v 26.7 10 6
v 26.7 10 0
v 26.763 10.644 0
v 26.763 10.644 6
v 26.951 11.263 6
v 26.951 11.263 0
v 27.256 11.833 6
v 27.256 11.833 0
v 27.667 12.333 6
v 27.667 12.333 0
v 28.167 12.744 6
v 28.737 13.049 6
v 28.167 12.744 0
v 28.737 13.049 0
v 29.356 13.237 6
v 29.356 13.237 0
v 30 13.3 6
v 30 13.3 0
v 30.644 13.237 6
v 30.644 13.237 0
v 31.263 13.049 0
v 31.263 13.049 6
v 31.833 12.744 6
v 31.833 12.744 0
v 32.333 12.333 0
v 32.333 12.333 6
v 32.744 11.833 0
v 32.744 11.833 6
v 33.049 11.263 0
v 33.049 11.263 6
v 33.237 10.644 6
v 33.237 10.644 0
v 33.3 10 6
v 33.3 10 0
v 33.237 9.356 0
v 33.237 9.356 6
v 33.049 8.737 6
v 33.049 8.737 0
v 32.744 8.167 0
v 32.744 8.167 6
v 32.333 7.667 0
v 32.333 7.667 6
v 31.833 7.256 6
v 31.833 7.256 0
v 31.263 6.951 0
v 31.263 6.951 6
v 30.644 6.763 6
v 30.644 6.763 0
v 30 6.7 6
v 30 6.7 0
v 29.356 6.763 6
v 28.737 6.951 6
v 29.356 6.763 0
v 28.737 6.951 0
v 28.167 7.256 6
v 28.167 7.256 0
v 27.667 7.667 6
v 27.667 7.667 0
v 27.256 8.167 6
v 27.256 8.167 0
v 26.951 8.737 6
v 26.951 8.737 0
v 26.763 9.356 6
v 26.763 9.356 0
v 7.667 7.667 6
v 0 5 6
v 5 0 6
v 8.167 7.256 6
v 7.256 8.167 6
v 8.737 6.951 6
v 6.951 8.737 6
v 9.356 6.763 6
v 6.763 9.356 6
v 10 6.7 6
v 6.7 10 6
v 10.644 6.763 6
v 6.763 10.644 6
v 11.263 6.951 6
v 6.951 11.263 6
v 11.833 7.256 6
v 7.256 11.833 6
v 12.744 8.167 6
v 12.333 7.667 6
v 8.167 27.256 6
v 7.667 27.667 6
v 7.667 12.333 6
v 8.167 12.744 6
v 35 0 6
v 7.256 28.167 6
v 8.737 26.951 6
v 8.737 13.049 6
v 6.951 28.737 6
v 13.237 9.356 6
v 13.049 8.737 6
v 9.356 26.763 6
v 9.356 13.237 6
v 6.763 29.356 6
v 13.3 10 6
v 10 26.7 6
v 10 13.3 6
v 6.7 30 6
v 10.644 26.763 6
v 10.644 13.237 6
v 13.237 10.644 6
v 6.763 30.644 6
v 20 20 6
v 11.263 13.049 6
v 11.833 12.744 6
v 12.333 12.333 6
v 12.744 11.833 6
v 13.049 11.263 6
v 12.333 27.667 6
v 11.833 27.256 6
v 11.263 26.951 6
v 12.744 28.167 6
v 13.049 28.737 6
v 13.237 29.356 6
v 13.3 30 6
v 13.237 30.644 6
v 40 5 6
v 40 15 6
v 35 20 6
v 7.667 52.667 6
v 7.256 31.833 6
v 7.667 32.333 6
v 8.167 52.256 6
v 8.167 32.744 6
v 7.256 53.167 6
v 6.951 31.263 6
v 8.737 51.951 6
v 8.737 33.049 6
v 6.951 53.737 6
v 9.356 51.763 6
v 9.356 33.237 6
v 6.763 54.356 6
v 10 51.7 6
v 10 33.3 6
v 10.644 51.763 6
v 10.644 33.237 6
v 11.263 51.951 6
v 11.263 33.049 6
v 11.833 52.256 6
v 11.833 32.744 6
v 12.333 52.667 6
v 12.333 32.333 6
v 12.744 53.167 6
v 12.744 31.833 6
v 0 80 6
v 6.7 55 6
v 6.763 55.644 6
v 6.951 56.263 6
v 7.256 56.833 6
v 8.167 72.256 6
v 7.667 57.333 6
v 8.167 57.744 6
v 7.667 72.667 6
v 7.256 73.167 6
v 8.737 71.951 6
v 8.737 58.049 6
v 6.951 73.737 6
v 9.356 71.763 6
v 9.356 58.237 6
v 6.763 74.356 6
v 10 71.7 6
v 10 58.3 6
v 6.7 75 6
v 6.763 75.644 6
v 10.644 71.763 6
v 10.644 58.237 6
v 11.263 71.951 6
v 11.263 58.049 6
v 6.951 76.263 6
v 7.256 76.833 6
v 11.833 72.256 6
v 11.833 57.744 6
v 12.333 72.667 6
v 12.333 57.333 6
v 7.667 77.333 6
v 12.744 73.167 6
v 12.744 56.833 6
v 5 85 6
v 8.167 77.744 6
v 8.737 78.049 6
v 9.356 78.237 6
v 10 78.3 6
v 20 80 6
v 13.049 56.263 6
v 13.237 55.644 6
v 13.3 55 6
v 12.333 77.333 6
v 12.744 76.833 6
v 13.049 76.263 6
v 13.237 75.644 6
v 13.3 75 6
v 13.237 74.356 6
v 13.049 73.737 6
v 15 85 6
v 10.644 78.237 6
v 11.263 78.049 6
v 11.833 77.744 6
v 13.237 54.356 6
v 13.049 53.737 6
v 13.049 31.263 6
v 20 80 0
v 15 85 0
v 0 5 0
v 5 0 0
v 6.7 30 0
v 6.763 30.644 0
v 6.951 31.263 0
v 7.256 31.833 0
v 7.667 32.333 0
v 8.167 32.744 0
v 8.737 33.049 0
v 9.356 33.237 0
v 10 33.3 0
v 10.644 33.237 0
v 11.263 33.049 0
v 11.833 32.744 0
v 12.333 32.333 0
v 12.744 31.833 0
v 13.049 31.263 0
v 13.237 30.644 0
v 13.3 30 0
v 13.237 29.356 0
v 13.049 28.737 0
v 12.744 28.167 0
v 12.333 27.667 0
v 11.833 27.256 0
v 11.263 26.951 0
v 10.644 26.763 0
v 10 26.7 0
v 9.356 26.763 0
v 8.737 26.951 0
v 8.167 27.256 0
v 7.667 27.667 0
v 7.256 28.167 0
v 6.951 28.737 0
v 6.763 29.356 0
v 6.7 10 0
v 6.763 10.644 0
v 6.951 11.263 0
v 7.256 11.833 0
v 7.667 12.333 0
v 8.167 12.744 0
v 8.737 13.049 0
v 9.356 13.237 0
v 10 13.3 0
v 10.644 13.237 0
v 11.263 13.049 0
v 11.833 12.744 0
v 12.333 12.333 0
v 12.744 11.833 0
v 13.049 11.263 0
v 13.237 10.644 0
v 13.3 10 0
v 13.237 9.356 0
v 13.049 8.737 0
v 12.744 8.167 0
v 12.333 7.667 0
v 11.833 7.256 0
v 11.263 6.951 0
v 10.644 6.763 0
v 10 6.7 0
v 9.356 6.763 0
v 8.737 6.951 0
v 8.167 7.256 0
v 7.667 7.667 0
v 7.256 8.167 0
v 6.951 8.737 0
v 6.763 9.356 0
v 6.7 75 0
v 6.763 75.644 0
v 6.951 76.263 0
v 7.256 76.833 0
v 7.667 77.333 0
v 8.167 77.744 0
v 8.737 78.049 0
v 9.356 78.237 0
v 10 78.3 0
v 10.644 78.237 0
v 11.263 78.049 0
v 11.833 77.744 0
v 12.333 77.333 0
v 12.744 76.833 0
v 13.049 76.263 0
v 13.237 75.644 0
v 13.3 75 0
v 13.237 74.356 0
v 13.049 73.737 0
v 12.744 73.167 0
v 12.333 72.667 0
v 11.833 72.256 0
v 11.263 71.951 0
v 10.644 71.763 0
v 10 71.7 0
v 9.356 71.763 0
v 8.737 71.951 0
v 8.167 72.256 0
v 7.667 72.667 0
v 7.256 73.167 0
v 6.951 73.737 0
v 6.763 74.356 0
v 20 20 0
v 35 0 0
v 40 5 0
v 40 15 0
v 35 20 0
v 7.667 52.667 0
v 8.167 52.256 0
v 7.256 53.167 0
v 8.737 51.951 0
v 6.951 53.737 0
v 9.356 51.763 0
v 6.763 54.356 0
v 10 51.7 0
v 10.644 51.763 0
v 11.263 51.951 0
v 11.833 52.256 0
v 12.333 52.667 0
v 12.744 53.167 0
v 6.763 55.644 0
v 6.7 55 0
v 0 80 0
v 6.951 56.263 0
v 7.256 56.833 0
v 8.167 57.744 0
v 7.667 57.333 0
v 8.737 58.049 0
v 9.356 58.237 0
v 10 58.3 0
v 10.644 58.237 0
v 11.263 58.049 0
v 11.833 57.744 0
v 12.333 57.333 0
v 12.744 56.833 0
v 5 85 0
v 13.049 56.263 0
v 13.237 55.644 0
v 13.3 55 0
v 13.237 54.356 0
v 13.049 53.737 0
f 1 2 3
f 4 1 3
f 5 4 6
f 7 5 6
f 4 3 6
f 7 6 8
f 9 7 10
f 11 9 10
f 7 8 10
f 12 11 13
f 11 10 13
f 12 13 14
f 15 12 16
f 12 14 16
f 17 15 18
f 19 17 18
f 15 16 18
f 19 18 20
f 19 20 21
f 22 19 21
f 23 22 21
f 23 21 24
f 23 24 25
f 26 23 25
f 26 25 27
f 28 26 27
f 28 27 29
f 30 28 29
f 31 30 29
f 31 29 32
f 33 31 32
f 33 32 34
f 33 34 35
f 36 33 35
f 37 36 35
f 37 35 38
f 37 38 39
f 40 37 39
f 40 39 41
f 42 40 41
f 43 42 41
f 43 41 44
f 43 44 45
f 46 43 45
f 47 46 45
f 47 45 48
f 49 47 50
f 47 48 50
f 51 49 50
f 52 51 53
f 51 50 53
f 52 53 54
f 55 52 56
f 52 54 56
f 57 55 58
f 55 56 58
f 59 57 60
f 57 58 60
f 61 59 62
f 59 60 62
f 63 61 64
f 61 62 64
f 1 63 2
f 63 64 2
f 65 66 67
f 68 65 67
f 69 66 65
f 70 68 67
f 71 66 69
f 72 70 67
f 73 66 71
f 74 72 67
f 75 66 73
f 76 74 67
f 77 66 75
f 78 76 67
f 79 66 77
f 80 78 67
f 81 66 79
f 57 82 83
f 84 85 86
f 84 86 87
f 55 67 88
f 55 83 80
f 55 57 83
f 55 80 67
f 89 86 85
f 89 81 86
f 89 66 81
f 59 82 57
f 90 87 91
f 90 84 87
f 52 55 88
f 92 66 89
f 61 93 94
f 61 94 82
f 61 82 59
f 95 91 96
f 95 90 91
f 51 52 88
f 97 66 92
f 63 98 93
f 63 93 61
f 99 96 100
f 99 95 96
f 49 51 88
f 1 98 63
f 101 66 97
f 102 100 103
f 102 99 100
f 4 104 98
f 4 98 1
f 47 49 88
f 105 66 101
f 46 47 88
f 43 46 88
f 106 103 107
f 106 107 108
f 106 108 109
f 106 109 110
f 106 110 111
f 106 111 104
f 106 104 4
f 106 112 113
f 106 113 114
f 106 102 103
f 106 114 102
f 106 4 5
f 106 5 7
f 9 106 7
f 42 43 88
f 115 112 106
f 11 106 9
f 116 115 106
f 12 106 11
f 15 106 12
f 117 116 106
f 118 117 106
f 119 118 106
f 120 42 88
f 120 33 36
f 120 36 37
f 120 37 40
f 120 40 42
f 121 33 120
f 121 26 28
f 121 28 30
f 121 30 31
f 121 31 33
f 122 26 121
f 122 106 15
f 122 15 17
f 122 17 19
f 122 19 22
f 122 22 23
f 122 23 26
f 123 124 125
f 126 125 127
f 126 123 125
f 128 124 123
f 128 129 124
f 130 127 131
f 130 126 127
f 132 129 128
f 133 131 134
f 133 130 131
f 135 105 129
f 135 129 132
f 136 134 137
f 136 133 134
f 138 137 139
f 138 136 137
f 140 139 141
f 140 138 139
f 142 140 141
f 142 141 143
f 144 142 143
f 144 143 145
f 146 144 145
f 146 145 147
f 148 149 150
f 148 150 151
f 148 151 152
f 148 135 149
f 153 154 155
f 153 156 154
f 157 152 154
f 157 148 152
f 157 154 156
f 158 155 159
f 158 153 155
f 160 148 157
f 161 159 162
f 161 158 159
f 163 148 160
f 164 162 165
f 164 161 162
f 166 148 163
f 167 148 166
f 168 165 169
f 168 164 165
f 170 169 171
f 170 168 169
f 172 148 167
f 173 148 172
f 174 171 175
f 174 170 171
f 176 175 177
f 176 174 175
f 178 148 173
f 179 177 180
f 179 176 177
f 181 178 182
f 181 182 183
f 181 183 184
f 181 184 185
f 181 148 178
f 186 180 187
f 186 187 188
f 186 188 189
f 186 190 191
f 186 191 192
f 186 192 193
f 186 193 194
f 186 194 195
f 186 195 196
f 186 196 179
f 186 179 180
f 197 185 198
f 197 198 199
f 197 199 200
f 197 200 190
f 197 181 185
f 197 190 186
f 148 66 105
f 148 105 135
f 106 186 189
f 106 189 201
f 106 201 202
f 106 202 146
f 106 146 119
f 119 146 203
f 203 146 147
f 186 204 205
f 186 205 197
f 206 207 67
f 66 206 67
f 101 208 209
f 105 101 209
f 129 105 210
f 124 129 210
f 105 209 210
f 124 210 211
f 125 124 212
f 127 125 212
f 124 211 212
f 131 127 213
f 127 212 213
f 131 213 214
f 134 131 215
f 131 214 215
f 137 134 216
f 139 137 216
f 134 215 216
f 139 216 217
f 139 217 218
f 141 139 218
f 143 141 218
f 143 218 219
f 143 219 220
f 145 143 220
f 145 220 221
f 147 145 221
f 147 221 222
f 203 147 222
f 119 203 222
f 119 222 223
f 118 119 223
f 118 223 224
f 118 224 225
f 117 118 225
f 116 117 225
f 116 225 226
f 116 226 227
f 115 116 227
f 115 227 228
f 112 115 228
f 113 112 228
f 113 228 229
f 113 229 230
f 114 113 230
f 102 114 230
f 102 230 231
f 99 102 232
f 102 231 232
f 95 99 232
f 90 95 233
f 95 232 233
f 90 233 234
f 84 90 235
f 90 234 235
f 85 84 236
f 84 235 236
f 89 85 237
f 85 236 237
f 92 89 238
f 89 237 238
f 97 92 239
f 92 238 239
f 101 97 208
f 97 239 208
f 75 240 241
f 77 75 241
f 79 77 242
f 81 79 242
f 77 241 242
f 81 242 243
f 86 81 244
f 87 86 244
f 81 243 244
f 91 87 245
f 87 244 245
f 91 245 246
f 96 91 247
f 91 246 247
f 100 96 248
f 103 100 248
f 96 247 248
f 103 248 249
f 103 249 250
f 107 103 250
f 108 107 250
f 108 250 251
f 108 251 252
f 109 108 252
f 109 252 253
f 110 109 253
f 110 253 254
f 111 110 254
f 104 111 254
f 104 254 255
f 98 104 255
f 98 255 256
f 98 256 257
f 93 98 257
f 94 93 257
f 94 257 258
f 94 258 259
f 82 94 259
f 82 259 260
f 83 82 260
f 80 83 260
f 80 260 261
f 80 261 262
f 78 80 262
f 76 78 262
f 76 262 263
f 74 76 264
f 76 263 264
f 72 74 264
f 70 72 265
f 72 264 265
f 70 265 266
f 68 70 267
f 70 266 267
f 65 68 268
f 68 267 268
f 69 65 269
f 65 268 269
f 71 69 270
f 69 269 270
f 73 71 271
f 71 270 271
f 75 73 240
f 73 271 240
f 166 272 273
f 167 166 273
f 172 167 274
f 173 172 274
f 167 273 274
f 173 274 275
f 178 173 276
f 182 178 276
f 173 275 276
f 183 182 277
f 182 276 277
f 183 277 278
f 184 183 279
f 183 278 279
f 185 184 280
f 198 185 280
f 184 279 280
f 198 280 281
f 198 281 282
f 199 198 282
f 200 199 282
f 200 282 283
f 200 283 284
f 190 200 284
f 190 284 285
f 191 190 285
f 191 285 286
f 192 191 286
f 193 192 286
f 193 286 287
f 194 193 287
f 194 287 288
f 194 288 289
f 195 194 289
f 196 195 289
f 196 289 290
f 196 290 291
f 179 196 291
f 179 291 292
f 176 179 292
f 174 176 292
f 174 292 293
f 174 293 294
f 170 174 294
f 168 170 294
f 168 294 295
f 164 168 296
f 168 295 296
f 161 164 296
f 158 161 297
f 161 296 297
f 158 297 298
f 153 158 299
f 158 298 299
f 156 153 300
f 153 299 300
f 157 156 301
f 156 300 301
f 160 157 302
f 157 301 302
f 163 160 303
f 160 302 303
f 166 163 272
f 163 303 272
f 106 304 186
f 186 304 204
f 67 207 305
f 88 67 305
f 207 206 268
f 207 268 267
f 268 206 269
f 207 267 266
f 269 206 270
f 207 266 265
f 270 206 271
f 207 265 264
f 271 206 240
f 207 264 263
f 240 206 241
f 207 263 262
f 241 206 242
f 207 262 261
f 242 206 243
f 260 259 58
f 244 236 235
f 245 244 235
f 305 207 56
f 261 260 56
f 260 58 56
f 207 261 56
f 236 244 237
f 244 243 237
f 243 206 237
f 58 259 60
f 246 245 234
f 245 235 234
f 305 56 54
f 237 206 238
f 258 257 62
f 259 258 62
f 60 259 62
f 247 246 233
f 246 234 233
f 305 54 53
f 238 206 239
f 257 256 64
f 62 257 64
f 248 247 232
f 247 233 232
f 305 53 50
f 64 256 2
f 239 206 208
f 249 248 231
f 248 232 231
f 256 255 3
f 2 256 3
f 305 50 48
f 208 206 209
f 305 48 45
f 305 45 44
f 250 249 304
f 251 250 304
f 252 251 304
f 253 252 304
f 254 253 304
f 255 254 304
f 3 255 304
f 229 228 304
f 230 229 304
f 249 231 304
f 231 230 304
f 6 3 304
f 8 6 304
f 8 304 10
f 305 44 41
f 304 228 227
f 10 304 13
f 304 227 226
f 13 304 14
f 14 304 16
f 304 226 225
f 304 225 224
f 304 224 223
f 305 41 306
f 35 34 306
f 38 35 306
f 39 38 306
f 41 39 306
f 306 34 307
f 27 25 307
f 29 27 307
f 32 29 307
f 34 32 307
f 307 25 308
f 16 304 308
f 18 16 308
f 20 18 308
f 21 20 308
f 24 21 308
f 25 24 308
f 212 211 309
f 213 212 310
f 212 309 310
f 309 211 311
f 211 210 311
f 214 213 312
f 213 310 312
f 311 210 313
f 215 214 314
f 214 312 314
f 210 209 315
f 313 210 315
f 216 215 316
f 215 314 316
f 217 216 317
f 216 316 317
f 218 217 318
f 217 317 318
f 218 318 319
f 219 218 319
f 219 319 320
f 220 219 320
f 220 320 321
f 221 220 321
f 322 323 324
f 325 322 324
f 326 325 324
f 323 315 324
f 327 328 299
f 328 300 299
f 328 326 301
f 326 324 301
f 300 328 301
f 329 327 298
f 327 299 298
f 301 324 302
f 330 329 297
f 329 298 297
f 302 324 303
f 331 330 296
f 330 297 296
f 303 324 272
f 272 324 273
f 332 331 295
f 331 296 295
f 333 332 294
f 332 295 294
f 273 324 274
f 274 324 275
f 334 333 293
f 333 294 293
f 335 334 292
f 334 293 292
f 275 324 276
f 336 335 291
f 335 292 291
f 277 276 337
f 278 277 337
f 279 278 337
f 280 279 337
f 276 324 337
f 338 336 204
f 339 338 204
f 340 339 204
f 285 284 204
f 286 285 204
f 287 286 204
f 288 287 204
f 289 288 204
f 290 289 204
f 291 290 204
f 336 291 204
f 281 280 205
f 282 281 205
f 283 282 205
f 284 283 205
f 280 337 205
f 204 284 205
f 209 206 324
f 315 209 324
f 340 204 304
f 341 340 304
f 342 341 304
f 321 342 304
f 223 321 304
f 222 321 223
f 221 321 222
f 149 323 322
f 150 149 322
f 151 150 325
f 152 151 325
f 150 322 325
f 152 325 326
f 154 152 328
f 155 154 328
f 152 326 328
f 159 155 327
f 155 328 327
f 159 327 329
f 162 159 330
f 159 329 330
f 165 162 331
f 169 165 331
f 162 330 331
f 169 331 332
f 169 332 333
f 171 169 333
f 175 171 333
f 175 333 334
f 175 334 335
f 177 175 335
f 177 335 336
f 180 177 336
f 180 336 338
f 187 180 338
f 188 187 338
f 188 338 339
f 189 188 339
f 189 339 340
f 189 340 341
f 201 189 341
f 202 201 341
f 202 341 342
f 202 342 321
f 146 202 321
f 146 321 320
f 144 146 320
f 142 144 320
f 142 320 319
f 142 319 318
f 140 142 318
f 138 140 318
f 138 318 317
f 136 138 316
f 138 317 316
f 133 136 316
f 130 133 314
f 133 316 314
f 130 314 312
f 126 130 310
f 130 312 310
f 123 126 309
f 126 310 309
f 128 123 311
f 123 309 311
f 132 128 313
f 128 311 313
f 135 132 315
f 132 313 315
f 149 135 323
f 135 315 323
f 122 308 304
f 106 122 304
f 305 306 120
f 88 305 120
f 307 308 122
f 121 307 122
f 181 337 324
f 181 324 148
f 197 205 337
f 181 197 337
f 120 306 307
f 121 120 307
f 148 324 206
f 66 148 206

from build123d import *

# Parameters (mm, degrees)
F1_DEPTH = 6
F3_D     = 6.6
F4_SIZE  = 5


with BuildPart() as f1:
    # F0 (on Top) → F1 (new body)
    with BuildSketch(Plane.XY):
        Polygon((0, 85), (0, 0), (15.6104657799, 0), (20, 0), (40, 0), (40, 20), (20, 20), (20, 85), align=None)
    extrude(amount=F1_DEPTH)

    # F3 (through all)
    with Locations(Plane.XY.offset(6)):
        with Locations((10, 75), (10, 55), (10, 10), (30, 10), (10, 30)):
            Hole(F3_D / 2)

    # F4
    f4_edges = [f1.edges().sort_by_distance(p)[0] for p in [
        (20, 85, 3),
        (0, 85, 3),
        (40, 20, 3),
        (40, 0, 3),
        (0, 0, 3),
    ]]
    chamfer(f4_edges, length=F4_SIZE)


solid = f1.part
